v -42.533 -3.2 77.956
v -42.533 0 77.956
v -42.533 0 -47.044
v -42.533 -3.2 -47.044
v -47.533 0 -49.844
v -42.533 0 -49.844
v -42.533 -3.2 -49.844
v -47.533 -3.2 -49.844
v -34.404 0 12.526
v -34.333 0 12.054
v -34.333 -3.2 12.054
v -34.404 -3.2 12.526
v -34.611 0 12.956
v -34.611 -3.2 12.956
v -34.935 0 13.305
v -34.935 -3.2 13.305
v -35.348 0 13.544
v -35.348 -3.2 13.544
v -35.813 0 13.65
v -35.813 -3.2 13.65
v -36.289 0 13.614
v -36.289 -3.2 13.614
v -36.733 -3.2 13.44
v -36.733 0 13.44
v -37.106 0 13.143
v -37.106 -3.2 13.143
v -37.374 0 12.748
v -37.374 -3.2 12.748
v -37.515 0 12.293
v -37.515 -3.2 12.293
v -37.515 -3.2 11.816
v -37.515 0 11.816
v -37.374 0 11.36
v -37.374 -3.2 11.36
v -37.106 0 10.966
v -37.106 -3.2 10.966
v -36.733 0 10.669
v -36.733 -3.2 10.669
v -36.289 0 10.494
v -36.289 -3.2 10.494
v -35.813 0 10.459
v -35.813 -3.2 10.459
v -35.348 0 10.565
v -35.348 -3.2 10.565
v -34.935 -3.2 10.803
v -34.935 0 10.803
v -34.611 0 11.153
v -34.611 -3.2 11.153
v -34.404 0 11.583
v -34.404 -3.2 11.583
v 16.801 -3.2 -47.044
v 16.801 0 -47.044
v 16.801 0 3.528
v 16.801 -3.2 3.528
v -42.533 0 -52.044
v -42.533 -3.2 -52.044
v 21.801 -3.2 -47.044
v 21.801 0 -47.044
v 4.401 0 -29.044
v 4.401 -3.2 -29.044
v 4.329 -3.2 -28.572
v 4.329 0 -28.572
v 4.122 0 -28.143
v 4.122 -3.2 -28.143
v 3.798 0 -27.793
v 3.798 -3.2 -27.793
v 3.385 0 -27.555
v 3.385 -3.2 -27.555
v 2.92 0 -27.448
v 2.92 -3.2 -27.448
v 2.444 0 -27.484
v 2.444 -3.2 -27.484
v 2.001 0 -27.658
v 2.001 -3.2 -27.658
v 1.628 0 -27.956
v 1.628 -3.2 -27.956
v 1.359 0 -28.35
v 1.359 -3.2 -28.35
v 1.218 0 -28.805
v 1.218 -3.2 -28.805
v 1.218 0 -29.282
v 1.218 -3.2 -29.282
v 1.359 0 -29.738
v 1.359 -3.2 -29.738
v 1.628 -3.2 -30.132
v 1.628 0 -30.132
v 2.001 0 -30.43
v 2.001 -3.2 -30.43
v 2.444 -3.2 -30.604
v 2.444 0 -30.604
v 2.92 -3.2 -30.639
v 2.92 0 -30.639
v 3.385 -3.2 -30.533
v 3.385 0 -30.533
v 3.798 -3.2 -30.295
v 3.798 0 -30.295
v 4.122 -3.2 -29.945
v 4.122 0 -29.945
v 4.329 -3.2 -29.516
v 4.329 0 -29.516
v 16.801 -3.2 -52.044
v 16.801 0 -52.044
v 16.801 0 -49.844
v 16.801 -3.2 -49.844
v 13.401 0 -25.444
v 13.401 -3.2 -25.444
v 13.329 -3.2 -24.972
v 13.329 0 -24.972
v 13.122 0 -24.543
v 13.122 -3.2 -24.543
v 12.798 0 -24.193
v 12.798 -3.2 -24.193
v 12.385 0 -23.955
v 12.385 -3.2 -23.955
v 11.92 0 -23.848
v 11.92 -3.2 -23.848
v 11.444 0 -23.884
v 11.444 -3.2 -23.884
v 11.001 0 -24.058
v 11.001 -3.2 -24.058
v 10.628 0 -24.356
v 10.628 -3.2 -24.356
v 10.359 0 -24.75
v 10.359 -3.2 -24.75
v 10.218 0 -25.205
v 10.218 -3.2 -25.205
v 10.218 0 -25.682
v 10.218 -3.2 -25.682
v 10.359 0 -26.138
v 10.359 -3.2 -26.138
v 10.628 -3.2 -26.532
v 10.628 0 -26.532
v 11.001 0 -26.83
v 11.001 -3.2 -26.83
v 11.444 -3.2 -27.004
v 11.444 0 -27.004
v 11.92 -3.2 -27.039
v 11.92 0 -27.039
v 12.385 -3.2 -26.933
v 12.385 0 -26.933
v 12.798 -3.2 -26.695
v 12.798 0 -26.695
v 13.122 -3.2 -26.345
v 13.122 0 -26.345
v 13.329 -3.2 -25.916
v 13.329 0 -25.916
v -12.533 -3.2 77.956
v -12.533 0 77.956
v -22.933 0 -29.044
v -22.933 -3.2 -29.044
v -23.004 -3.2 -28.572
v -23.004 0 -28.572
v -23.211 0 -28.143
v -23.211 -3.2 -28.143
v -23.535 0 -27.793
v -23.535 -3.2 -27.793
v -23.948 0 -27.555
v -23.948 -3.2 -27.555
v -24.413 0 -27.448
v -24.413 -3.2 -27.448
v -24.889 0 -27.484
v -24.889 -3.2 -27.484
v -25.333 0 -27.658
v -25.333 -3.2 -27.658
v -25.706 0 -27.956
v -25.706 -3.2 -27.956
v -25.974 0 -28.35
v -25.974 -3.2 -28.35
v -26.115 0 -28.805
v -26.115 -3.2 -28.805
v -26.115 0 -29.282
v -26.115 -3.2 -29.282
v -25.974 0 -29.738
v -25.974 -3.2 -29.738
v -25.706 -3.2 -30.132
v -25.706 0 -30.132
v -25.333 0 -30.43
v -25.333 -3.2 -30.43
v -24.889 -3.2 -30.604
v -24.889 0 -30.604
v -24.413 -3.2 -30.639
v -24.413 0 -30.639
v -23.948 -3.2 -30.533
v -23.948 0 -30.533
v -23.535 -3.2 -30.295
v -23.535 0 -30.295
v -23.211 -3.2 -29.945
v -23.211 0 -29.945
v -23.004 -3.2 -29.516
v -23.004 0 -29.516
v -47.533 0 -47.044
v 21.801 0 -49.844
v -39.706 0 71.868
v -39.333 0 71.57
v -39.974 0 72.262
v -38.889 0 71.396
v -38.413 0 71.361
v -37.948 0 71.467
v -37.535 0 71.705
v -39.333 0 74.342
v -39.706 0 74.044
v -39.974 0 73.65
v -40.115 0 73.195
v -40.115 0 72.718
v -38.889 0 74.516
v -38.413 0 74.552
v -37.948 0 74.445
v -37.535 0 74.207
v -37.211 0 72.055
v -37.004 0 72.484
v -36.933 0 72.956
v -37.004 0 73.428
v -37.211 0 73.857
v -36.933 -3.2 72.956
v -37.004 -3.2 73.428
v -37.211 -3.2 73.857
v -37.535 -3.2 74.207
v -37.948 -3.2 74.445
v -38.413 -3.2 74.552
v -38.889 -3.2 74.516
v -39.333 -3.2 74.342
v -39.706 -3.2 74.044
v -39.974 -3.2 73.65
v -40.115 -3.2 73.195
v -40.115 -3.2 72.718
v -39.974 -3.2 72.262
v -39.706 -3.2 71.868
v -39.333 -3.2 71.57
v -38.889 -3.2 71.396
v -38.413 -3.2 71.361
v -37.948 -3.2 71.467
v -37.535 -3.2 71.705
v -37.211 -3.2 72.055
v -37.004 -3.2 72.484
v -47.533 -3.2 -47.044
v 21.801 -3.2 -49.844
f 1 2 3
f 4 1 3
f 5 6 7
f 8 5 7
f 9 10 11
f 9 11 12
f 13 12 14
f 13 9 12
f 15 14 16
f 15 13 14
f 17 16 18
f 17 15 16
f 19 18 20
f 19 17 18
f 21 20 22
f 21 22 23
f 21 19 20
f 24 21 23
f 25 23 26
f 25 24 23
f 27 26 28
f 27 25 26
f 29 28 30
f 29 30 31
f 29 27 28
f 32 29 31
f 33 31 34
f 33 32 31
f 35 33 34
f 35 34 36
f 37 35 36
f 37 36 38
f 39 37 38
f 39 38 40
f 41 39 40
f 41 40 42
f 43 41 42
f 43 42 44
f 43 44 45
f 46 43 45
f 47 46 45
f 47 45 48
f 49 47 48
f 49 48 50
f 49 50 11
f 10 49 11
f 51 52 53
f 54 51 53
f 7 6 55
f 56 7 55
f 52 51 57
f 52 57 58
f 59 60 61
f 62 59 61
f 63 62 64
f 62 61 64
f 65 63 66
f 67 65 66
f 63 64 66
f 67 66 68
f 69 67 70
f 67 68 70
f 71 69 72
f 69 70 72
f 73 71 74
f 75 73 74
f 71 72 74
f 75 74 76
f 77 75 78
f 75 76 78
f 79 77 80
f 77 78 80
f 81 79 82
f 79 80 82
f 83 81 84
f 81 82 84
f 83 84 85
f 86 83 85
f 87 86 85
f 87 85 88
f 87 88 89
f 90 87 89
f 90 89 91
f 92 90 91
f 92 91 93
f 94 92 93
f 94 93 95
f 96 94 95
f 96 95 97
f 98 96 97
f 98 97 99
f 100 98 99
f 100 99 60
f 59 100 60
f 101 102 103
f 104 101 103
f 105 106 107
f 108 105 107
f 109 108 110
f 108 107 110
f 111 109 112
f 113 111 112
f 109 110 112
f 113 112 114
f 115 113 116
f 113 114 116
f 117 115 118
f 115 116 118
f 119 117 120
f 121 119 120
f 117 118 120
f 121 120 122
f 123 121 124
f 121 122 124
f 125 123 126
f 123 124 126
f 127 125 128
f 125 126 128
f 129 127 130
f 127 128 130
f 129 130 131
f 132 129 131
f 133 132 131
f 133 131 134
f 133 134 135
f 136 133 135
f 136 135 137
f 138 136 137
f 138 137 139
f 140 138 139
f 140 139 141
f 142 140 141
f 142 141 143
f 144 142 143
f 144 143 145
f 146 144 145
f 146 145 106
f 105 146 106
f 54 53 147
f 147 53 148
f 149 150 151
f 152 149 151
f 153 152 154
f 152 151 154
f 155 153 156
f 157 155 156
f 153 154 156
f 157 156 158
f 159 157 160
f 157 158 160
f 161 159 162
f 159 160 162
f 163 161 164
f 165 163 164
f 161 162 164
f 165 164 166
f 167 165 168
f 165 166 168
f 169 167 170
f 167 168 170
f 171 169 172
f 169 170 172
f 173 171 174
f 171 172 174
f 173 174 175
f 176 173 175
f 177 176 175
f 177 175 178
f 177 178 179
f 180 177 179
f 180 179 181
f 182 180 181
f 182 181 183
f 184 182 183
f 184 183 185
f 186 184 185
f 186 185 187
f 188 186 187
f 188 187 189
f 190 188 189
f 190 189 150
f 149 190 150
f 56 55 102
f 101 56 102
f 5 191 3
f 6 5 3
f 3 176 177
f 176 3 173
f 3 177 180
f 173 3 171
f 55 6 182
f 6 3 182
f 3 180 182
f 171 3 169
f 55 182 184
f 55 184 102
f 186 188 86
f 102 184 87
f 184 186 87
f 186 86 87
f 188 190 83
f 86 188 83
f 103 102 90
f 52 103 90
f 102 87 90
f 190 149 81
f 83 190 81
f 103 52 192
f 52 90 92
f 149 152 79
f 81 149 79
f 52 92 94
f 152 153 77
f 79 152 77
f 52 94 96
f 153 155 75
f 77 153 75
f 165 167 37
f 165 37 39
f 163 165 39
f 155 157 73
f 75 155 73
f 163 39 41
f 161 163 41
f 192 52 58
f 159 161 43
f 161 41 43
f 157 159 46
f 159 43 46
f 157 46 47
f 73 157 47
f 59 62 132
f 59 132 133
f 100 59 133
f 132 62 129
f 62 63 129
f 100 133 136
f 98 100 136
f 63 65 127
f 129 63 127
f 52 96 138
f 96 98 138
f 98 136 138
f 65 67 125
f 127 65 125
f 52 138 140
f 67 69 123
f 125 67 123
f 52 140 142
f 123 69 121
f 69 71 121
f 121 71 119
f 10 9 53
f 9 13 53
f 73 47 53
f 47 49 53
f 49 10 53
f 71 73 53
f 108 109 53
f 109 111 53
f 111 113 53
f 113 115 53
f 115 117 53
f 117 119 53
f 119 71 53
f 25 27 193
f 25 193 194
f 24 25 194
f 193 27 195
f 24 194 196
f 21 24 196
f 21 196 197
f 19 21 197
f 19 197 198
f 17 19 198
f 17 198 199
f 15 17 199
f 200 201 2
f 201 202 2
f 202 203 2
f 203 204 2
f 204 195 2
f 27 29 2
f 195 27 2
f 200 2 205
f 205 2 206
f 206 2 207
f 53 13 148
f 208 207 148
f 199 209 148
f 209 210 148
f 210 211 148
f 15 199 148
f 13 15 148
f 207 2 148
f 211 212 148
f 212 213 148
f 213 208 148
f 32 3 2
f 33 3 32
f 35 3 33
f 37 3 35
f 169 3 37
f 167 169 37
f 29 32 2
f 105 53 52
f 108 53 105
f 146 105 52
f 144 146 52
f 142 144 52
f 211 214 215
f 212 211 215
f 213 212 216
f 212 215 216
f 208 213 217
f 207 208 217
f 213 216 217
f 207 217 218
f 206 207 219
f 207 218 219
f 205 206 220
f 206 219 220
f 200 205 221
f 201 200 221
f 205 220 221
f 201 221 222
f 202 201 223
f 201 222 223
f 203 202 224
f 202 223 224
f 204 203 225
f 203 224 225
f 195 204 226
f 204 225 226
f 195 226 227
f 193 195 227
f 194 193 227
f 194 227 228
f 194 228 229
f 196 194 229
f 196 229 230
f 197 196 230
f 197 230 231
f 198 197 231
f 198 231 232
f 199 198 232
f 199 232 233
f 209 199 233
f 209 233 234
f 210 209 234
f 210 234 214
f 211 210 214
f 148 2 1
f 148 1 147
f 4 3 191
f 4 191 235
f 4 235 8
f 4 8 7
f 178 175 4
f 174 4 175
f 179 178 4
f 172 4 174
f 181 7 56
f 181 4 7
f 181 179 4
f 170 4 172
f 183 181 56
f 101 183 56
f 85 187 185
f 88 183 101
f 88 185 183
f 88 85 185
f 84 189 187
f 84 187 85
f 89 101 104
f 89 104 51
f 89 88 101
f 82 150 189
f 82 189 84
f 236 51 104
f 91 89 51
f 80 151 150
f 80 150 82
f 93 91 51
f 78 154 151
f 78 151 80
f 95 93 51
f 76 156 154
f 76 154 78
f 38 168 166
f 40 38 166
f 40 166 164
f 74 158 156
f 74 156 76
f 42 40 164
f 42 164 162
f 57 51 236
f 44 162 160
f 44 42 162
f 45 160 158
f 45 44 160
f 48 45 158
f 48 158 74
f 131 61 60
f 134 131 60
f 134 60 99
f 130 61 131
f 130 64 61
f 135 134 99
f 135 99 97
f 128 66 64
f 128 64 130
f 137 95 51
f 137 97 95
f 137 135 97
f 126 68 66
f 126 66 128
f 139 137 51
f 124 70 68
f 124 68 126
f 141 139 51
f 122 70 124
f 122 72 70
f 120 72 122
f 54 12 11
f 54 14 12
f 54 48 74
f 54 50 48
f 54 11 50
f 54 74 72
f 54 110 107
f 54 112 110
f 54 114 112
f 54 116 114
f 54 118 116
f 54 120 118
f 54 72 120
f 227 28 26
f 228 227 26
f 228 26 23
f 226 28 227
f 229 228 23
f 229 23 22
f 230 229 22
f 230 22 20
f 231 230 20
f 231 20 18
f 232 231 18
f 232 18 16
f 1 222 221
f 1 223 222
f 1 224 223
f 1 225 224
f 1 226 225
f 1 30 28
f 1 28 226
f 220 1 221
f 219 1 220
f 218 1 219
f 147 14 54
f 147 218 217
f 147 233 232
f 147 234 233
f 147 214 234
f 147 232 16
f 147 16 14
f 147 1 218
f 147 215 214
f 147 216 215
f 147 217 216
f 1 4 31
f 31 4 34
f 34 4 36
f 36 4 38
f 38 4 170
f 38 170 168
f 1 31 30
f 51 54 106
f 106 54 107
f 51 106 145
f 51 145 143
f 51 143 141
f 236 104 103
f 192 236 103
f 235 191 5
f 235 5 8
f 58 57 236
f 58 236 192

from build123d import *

# Parameters (mm, degrees)
F0_R      = 1.6
F0_W      = 30
F0_H      = 47.428162
F0_W_2    = 59.333406
F0_H_2    = 55.571838
F1_DEPTH  = 3.2
F2_DEPTH  = 2.3
F3_R      = 1.6
F4_DEPTH  = 11
F5_R      = 1.6
F6_DEPTH  = 11
F7_W      = 3.2
F7_H      = 2.8
F8_DEPTH  = 5
F9_W      = 3.2
F9_H      = 2.8
F10_DEPTH = 5
F11_R     = 1.6
F12_DEPTH = 8
F13_R     = 1.6
F14_DEPTH = 10


with BuildPart() as f1:
    # F0 (on Front) → F1 (new body)
    with BuildSketch(Plane.XZ):
        Polygon((-42.532899, 30.527938), (-42.532899, 3.527938), (16.800507, 3.527938), (-12.532899, 77.9561), (-12.532899, 30.527938), align=None)
        with Locations((-35.932899, 12.05425)):
            Circle(F0_R, mode=Mode.SUBTRACT)
        with Locations((-27.532899, 54.242019)):
            Rectangle(F0_W, F0_H)
        with Locations((-12.866196, -24.257981)):
            Rectangle(F0_W_2, F0_H_2)
    extrude(amount=F1_DEPTH)

    # F0 (on Front) → F2 (join)
    with BuildSketch(Plane.XZ):
        Polygon((-42.532899, 30.527938), (-42.532899, 3.527938), (16.800507, 3.527938), (-12.532899, 77.9561), (-12.532899, 30.527938), align=None)
        with Locations((-35.932899, 12.05425)):
            Circle(F0_R, mode=Mode.SUBTRACT)
        with Locations((-12.866196, -24.257981)):
            Rectangle(F0_W_2, F0_H_2)
        with Locations((-27.532899, 54.242019)):
            Rectangle(F0_W, F0_H)
    extrude(amount=F2_DEPTH)

    # F3 (on face) → F4 (cut)
    with BuildSketch(Plane.XZ.offset(3.2)):
        with Locations((11.800507, -25.4439)):
            Circle(F3_R)
    extrude(amount=-F4_DEPTH, mode=Mode.SUBTRACT)

    # F5 (on face) → F6 (cut)
    with BuildSketch(Plane.XZ.offset(3.2)):
        with Locations((-38.532899, 72.9561)):
            Circle(F5_R)
    extrude(amount=-F6_DEPTH, mode=Mode.SUBTRACT)

    # F7 (on face) → F8 (join)
    with BuildSketch(Plane.YZ.offset(16.800507)):
        with Locations((-1.6, -48.4439)):
            Rectangle(F7_W, F7_H)
    extrude(amount=F8_DEPTH)

    # F9 (on face) → F10 (join)
    with BuildSketch(Plane(origin=(-42.532899, 0, 0), x_dir=(0, -1, 0), z_dir=(-1, 0, 0))):
        with Locations((1.6, -48.4439)):
            Rectangle(F9_W, F9_H)
    extrude(amount=F10_DEPTH)

    # F11 (on face) → F12 (cut)
    with BuildSketch(Plane.XZ.offset(3.2)):
        with Locations((-24.532899, -29.0439)):
            Circle(F11_R)
    extrude(amount=-F12_DEPTH, mode=Mode.SUBTRACT)

    # F13 (on face) → F14 (cut)
    with BuildSketch(Plane.XZ.offset(3.2)):
        with Locations((2.800507, -29.0439)):
            Circle(F13_R)
    extrude(amount=-F14_DEPTH, mode=Mode.SUBTRACT)


solid = f1.part
